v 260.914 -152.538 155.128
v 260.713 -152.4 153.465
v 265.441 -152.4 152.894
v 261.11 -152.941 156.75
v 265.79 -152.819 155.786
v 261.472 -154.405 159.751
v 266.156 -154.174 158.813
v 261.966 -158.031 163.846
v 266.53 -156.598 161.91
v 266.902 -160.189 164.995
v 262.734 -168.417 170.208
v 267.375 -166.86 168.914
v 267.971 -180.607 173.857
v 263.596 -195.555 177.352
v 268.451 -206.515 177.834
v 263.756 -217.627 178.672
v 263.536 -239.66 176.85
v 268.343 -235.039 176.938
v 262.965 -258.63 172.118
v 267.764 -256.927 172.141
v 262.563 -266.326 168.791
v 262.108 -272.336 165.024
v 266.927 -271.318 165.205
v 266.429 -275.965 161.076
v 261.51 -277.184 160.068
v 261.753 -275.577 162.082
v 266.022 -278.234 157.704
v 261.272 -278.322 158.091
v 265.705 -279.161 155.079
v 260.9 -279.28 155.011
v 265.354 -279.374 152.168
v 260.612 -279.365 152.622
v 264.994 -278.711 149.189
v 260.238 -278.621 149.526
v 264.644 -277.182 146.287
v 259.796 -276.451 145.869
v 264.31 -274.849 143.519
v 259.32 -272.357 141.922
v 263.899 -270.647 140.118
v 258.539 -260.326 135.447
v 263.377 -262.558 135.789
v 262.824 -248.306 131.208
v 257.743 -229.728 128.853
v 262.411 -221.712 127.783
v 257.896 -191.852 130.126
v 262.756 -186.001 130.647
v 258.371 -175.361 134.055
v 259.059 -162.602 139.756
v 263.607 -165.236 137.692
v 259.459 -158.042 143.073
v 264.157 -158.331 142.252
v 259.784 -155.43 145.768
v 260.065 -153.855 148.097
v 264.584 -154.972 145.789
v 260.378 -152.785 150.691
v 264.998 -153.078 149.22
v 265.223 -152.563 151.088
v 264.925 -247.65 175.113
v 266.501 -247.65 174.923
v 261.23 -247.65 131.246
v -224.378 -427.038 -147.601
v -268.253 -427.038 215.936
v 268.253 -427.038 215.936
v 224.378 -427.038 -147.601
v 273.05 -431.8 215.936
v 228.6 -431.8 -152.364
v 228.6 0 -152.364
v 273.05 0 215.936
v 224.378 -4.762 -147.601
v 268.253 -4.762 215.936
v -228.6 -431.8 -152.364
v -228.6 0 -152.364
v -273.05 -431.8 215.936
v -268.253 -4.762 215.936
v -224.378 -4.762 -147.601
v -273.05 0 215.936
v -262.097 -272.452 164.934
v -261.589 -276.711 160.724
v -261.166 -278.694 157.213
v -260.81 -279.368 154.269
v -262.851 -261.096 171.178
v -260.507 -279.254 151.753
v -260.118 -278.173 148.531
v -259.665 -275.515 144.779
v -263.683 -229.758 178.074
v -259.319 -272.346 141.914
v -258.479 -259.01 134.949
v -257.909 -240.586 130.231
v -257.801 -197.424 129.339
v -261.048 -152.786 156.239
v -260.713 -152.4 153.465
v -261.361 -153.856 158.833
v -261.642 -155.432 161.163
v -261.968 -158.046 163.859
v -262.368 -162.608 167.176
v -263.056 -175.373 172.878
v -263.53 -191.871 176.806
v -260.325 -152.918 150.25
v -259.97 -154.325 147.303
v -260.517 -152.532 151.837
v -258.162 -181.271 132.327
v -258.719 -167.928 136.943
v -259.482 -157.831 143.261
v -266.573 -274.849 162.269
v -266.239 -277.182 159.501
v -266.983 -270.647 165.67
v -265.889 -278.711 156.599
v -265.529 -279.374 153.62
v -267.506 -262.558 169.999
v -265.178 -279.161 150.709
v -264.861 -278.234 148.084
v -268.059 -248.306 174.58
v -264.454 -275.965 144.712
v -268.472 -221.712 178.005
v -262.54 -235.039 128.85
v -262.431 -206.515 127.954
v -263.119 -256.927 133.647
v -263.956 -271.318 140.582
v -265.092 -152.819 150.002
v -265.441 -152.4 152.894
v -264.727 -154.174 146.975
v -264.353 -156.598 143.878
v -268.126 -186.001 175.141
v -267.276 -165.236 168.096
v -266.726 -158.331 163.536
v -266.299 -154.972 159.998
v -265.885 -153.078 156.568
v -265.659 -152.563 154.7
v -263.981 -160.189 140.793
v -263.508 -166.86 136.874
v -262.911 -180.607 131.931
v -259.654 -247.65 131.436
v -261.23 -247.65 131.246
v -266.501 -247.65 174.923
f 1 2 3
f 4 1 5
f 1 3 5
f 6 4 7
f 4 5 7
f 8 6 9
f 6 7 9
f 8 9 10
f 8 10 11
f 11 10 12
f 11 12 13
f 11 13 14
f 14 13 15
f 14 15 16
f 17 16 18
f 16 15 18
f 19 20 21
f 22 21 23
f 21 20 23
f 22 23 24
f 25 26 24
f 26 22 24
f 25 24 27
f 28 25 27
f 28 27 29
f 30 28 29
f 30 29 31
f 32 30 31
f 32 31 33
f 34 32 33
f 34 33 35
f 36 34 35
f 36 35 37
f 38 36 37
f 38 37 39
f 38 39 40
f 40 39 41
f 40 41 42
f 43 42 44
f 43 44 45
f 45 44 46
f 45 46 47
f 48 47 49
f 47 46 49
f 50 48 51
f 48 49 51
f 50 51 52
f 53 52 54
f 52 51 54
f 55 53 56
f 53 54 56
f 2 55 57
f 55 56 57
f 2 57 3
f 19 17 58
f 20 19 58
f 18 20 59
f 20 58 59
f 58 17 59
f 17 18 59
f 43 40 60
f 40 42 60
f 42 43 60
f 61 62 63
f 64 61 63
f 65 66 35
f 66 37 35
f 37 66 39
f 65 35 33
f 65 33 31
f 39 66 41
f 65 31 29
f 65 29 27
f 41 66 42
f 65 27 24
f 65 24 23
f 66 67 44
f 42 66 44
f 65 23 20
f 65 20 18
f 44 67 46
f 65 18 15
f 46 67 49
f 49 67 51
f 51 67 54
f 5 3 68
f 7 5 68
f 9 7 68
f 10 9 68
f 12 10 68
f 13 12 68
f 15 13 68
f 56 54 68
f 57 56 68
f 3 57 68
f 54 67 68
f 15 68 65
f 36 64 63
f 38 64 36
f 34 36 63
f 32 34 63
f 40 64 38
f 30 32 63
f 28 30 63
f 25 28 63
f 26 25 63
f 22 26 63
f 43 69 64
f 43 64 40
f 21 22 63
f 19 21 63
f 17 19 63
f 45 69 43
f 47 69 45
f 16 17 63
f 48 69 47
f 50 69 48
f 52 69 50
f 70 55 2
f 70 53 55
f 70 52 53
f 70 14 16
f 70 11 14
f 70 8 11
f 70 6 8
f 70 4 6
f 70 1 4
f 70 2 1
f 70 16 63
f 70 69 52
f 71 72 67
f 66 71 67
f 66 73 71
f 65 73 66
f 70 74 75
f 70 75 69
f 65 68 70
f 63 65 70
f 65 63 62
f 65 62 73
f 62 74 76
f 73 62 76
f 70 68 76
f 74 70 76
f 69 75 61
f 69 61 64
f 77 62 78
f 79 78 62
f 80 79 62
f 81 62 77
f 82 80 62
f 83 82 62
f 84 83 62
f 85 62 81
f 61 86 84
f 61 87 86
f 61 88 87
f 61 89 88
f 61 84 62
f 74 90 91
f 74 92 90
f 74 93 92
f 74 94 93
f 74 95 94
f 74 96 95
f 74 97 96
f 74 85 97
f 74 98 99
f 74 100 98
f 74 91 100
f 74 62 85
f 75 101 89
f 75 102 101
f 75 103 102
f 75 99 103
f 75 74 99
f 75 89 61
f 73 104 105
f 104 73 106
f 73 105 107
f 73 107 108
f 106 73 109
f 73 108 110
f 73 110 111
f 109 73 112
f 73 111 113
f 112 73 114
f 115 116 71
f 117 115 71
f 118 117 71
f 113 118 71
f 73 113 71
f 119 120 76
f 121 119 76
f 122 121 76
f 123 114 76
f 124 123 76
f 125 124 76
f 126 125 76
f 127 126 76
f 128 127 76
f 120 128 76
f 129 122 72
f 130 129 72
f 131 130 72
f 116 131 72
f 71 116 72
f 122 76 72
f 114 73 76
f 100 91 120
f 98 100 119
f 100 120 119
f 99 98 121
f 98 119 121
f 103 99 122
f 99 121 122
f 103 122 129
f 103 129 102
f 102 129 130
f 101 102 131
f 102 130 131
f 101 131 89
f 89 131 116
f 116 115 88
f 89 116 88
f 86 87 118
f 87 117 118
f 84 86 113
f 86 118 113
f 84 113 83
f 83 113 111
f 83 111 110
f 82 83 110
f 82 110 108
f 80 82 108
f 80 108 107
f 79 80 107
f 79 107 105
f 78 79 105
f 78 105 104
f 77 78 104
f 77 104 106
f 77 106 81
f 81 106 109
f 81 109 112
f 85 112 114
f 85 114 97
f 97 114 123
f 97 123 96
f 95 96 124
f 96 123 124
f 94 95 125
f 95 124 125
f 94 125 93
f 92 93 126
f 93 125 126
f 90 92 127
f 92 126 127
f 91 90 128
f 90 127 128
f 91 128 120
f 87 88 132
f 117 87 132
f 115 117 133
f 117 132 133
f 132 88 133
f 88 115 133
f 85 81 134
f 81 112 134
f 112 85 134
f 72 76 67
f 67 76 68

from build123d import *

# Parameters (mm, degrees)
F1_DEPTH = 431.8
F2_T     = -4.7625
F4_DEPTH = 25.4
F6_DEPTH = 25.4


with BuildPart() as f1:
    # F0 (on Front) → F1 (new body)
    with BuildSketch(Plane.XZ):
        Polygon((273.05, 215.9364468904), (-273.05, 215.9364468904), (-228.6, -152.3635531096), (228.6, -152.3635531096), align=None)
    extrude(amount=F1_DEPTH)

    # F2
    f2_openings = [f1.faces().sort_by_distance(p)[0] for p in [
        (0, -215.9, 215.936447),
    ]]
    offset(amount=F2_T, openings=f2_openings)

    # F3 (on face) → F4 (cut)
    with BuildSketch(Plane(origin=(-243.4427197663, 0, -29.3810179028), x_dir=(0, -1, 0), z_dir=(-0.992795613, 0, -0.1198201602))):
        with BuildLine():
            add(Edge.make_bspline(
                [(152.4, 183.5976519019), (152.4, 139.6035613896), (247.65, 161.6006066457), (342.9, 183.5976519019), (247.65, 205.594697158), (152.4, 227.5917424141), (152.4, 183.5976519019)],
                knots=[0, 0, 0, 2.0943951024, 2.0943951024, 4.1887902048, 4.1887902048, 6.2831853072, 6.2831853072, 6.2831853072], degree=2, weights=[1, 0.5, 1, 0.5, 1, 0.5, 1]))
        make_face()
    extrude(amount=-F4_DEPTH, mode=Mode.SUBTRACT)

    # F5 (on face) → F6 (cut)
    with BuildSketch(Plane(origin=(243.4427197663, 0, -29.3810179028), x_dir=(0, 1, 0), z_dir=(0.992795613, 0, -0.1198201602))):
        with BuildLine():
            add(Edge.make_bspline(
                [(-152.4, 183.5976519019), (-152.4, 227.5917424141), (-247.65, 205.594697158), (-342.9, 183.5976519019), (-247.65, 161.6006066457), (-152.4, 139.6035613896), (-152.4, 183.5976519019)],
                knots=[0, 0, 0, 2.0943951024, 2.0943951024, 4.1887902048, 4.1887902048, 6.2831853072, 6.2831853072, 6.2831853072], degree=2, weights=[1, 0.5, 1, 0.5, 1, 0.5, 1]))
        make_face()
    extrude(amount=-F6_DEPTH, mode=Mode.SUBTRACT)


solid = f1.part
